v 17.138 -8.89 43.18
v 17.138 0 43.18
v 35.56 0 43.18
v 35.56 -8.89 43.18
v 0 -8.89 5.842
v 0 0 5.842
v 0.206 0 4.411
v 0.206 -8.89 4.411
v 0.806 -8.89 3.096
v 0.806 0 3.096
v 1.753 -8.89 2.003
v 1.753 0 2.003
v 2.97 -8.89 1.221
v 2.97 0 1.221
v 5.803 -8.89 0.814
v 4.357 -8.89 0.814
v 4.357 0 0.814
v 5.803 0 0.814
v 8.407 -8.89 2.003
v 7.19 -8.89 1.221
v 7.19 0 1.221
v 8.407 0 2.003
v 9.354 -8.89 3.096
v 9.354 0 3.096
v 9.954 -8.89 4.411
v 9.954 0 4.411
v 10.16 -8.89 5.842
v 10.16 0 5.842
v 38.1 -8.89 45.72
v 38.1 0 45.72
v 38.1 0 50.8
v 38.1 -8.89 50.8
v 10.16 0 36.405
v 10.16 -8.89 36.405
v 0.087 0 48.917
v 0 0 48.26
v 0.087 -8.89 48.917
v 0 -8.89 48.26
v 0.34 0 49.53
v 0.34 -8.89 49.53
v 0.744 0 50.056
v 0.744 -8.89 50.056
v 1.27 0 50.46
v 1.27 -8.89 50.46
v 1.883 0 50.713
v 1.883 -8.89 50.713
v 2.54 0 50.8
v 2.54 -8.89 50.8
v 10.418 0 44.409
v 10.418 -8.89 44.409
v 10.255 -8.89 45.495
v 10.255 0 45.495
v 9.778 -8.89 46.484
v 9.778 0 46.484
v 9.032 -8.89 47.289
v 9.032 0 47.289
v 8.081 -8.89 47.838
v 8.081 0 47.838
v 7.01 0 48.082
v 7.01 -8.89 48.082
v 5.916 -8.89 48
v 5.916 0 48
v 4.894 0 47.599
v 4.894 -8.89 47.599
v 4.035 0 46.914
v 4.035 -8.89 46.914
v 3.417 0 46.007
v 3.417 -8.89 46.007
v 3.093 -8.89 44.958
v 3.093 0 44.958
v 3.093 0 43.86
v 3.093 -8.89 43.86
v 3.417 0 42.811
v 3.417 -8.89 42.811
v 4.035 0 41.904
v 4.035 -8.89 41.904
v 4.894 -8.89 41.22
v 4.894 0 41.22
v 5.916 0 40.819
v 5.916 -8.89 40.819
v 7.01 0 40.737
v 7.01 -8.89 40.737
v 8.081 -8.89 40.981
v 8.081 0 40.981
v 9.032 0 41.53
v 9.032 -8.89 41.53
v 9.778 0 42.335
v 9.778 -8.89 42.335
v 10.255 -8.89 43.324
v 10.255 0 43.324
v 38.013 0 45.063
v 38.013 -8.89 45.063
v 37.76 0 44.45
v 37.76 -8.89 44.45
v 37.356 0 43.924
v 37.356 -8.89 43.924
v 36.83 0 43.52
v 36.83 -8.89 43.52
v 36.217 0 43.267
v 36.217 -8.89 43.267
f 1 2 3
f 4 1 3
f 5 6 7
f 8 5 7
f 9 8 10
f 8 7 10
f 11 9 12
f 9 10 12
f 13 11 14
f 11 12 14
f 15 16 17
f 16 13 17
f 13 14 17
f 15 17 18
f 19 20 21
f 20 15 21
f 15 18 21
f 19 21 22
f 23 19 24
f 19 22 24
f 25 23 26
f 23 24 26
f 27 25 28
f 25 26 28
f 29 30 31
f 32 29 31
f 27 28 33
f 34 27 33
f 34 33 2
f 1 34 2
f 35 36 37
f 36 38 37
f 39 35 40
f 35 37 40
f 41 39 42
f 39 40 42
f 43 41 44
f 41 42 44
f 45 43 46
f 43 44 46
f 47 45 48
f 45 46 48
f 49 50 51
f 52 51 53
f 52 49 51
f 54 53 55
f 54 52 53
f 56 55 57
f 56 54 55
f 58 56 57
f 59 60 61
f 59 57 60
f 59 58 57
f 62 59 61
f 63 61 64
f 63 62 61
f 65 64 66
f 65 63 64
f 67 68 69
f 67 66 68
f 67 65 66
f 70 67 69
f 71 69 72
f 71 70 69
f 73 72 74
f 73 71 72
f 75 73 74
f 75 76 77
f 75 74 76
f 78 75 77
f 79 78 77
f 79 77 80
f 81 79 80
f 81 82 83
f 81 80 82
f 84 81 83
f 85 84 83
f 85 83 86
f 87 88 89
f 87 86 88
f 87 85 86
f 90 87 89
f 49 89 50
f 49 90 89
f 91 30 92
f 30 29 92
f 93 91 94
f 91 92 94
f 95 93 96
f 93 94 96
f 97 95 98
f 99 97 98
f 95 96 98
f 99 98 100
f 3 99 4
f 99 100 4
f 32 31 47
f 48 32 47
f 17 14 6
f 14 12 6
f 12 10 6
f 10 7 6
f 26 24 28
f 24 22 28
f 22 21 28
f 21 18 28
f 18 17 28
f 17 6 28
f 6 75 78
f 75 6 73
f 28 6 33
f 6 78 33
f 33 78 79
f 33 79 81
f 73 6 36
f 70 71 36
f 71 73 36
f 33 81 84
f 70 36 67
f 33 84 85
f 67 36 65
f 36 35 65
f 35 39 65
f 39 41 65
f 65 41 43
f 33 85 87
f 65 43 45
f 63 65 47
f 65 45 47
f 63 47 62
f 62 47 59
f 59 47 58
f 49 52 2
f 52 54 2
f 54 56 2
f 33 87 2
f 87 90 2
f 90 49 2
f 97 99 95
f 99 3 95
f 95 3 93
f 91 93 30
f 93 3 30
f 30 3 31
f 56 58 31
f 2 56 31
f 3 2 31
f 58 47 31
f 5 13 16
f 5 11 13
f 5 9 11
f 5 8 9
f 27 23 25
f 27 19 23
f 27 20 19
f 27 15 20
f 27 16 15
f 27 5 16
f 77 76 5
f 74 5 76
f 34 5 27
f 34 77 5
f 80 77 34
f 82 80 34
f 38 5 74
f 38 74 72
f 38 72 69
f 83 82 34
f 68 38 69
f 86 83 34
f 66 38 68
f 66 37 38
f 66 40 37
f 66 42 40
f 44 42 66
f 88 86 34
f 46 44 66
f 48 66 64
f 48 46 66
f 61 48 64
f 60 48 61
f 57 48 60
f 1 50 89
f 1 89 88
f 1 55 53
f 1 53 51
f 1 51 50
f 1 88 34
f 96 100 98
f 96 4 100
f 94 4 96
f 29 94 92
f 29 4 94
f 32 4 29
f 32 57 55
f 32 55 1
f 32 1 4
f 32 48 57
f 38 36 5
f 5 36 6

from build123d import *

# Parameters (mm, degrees)
F1_DEPTH    = 8.89
F2_R        = 3.683
F3_DEPTH    = 13.208
F4_R        = 2.54
F5_T1_DEPTH = 38.1
F6_T1_DEPTH = 47.4109630585


# Not quite as in the source:
# - a fillet or chamfer that OpenCascade refuses, or shapes differently, is made with other operations: its cross-section is extruded or revolved along the edge and cut away or added


with BuildPart() as f1:
    # F0 (on Front) → F1 (new body)
    with BuildSketch(Plane.XZ):
        Polygon((0, 50.8), (0, 0), (10.16, 0), (10.16, 36.405056715), (10.16, 43.18), (17.1377565712, 43.18), (38.1, 43.18), (38.1, 50.8), align=None)
        Polygon((10.16, 43.18), (10.16, 36.405056715), (17.1377565712, 43.18), align=None)
    extrude(amount=F1_DEPTH)

    # F2 (on Front) → F3 (cut)
    with BuildSketch(Plane.XZ):
        with Locations((6.7352303304, 44.409301132)):
            Circle(F2_R)
    extrude(amount=F3_DEPTH, mode=Mode.SUBTRACT)

    # F4
    f4_edges = [f1.edges().sort_by_distance(p)[0] for p in [
        (0, -4.445, 50.8),
        (38.1, -4.445, 43.18),
    ]]
    fillet(f4_edges, radius=F4_R)

    # F5: fillet of radius 5.842 on 2 edges, made by hand

    # F5_s2 → F5_t1 (cut)
    with BuildSketch(Plane.XZ.offset(-14.605)):
        with BuildLine():
            ThreePointArc((0, 5.842), (1.7110821843, 1.7110821843), (5.842, 0))
            Line((5.842, 0), (0, 0))
            Line((0, 0), (0, 5.842))
        make_face()
        with BuildLine():
            ThreePointArc((4.318, 0), (8.4489178157, 1.7110821843), (10.16, 5.842))
            Line((10.16, 5.842), (10.16, 0))
            Line((10.16, 0), (4.318, 0))
        make_face()
    extrude(amount=F5_T1_DEPTH, mode=Mode.SUBTRACT)

    # F6: fillet of radius 5.08 on 1 edges, made by hand

    # F6_s2 → F6_t1 (cut)
    with BuildSketch(Plane.XZ.offset(-19.2604815292)):
        with BuildLine():
            ThreePointArc((0, 5.8419882424), (5.08, 0.7619984664), (10.16, 5.8419882424))
            ThreePointArc((10.16, 5.8419882424), (8.710066706, 1.9898948547), (5.08, 0.0499088405))
            ThreePointArc((5.08, 0.0499088405), (1.449933294, 1.9898948547), (0, 5.8419882424))
        make_face()
    extrude(amount=F6_T1_DEPTH, mode=Mode.SUBTRACT)


solid = f1.part
